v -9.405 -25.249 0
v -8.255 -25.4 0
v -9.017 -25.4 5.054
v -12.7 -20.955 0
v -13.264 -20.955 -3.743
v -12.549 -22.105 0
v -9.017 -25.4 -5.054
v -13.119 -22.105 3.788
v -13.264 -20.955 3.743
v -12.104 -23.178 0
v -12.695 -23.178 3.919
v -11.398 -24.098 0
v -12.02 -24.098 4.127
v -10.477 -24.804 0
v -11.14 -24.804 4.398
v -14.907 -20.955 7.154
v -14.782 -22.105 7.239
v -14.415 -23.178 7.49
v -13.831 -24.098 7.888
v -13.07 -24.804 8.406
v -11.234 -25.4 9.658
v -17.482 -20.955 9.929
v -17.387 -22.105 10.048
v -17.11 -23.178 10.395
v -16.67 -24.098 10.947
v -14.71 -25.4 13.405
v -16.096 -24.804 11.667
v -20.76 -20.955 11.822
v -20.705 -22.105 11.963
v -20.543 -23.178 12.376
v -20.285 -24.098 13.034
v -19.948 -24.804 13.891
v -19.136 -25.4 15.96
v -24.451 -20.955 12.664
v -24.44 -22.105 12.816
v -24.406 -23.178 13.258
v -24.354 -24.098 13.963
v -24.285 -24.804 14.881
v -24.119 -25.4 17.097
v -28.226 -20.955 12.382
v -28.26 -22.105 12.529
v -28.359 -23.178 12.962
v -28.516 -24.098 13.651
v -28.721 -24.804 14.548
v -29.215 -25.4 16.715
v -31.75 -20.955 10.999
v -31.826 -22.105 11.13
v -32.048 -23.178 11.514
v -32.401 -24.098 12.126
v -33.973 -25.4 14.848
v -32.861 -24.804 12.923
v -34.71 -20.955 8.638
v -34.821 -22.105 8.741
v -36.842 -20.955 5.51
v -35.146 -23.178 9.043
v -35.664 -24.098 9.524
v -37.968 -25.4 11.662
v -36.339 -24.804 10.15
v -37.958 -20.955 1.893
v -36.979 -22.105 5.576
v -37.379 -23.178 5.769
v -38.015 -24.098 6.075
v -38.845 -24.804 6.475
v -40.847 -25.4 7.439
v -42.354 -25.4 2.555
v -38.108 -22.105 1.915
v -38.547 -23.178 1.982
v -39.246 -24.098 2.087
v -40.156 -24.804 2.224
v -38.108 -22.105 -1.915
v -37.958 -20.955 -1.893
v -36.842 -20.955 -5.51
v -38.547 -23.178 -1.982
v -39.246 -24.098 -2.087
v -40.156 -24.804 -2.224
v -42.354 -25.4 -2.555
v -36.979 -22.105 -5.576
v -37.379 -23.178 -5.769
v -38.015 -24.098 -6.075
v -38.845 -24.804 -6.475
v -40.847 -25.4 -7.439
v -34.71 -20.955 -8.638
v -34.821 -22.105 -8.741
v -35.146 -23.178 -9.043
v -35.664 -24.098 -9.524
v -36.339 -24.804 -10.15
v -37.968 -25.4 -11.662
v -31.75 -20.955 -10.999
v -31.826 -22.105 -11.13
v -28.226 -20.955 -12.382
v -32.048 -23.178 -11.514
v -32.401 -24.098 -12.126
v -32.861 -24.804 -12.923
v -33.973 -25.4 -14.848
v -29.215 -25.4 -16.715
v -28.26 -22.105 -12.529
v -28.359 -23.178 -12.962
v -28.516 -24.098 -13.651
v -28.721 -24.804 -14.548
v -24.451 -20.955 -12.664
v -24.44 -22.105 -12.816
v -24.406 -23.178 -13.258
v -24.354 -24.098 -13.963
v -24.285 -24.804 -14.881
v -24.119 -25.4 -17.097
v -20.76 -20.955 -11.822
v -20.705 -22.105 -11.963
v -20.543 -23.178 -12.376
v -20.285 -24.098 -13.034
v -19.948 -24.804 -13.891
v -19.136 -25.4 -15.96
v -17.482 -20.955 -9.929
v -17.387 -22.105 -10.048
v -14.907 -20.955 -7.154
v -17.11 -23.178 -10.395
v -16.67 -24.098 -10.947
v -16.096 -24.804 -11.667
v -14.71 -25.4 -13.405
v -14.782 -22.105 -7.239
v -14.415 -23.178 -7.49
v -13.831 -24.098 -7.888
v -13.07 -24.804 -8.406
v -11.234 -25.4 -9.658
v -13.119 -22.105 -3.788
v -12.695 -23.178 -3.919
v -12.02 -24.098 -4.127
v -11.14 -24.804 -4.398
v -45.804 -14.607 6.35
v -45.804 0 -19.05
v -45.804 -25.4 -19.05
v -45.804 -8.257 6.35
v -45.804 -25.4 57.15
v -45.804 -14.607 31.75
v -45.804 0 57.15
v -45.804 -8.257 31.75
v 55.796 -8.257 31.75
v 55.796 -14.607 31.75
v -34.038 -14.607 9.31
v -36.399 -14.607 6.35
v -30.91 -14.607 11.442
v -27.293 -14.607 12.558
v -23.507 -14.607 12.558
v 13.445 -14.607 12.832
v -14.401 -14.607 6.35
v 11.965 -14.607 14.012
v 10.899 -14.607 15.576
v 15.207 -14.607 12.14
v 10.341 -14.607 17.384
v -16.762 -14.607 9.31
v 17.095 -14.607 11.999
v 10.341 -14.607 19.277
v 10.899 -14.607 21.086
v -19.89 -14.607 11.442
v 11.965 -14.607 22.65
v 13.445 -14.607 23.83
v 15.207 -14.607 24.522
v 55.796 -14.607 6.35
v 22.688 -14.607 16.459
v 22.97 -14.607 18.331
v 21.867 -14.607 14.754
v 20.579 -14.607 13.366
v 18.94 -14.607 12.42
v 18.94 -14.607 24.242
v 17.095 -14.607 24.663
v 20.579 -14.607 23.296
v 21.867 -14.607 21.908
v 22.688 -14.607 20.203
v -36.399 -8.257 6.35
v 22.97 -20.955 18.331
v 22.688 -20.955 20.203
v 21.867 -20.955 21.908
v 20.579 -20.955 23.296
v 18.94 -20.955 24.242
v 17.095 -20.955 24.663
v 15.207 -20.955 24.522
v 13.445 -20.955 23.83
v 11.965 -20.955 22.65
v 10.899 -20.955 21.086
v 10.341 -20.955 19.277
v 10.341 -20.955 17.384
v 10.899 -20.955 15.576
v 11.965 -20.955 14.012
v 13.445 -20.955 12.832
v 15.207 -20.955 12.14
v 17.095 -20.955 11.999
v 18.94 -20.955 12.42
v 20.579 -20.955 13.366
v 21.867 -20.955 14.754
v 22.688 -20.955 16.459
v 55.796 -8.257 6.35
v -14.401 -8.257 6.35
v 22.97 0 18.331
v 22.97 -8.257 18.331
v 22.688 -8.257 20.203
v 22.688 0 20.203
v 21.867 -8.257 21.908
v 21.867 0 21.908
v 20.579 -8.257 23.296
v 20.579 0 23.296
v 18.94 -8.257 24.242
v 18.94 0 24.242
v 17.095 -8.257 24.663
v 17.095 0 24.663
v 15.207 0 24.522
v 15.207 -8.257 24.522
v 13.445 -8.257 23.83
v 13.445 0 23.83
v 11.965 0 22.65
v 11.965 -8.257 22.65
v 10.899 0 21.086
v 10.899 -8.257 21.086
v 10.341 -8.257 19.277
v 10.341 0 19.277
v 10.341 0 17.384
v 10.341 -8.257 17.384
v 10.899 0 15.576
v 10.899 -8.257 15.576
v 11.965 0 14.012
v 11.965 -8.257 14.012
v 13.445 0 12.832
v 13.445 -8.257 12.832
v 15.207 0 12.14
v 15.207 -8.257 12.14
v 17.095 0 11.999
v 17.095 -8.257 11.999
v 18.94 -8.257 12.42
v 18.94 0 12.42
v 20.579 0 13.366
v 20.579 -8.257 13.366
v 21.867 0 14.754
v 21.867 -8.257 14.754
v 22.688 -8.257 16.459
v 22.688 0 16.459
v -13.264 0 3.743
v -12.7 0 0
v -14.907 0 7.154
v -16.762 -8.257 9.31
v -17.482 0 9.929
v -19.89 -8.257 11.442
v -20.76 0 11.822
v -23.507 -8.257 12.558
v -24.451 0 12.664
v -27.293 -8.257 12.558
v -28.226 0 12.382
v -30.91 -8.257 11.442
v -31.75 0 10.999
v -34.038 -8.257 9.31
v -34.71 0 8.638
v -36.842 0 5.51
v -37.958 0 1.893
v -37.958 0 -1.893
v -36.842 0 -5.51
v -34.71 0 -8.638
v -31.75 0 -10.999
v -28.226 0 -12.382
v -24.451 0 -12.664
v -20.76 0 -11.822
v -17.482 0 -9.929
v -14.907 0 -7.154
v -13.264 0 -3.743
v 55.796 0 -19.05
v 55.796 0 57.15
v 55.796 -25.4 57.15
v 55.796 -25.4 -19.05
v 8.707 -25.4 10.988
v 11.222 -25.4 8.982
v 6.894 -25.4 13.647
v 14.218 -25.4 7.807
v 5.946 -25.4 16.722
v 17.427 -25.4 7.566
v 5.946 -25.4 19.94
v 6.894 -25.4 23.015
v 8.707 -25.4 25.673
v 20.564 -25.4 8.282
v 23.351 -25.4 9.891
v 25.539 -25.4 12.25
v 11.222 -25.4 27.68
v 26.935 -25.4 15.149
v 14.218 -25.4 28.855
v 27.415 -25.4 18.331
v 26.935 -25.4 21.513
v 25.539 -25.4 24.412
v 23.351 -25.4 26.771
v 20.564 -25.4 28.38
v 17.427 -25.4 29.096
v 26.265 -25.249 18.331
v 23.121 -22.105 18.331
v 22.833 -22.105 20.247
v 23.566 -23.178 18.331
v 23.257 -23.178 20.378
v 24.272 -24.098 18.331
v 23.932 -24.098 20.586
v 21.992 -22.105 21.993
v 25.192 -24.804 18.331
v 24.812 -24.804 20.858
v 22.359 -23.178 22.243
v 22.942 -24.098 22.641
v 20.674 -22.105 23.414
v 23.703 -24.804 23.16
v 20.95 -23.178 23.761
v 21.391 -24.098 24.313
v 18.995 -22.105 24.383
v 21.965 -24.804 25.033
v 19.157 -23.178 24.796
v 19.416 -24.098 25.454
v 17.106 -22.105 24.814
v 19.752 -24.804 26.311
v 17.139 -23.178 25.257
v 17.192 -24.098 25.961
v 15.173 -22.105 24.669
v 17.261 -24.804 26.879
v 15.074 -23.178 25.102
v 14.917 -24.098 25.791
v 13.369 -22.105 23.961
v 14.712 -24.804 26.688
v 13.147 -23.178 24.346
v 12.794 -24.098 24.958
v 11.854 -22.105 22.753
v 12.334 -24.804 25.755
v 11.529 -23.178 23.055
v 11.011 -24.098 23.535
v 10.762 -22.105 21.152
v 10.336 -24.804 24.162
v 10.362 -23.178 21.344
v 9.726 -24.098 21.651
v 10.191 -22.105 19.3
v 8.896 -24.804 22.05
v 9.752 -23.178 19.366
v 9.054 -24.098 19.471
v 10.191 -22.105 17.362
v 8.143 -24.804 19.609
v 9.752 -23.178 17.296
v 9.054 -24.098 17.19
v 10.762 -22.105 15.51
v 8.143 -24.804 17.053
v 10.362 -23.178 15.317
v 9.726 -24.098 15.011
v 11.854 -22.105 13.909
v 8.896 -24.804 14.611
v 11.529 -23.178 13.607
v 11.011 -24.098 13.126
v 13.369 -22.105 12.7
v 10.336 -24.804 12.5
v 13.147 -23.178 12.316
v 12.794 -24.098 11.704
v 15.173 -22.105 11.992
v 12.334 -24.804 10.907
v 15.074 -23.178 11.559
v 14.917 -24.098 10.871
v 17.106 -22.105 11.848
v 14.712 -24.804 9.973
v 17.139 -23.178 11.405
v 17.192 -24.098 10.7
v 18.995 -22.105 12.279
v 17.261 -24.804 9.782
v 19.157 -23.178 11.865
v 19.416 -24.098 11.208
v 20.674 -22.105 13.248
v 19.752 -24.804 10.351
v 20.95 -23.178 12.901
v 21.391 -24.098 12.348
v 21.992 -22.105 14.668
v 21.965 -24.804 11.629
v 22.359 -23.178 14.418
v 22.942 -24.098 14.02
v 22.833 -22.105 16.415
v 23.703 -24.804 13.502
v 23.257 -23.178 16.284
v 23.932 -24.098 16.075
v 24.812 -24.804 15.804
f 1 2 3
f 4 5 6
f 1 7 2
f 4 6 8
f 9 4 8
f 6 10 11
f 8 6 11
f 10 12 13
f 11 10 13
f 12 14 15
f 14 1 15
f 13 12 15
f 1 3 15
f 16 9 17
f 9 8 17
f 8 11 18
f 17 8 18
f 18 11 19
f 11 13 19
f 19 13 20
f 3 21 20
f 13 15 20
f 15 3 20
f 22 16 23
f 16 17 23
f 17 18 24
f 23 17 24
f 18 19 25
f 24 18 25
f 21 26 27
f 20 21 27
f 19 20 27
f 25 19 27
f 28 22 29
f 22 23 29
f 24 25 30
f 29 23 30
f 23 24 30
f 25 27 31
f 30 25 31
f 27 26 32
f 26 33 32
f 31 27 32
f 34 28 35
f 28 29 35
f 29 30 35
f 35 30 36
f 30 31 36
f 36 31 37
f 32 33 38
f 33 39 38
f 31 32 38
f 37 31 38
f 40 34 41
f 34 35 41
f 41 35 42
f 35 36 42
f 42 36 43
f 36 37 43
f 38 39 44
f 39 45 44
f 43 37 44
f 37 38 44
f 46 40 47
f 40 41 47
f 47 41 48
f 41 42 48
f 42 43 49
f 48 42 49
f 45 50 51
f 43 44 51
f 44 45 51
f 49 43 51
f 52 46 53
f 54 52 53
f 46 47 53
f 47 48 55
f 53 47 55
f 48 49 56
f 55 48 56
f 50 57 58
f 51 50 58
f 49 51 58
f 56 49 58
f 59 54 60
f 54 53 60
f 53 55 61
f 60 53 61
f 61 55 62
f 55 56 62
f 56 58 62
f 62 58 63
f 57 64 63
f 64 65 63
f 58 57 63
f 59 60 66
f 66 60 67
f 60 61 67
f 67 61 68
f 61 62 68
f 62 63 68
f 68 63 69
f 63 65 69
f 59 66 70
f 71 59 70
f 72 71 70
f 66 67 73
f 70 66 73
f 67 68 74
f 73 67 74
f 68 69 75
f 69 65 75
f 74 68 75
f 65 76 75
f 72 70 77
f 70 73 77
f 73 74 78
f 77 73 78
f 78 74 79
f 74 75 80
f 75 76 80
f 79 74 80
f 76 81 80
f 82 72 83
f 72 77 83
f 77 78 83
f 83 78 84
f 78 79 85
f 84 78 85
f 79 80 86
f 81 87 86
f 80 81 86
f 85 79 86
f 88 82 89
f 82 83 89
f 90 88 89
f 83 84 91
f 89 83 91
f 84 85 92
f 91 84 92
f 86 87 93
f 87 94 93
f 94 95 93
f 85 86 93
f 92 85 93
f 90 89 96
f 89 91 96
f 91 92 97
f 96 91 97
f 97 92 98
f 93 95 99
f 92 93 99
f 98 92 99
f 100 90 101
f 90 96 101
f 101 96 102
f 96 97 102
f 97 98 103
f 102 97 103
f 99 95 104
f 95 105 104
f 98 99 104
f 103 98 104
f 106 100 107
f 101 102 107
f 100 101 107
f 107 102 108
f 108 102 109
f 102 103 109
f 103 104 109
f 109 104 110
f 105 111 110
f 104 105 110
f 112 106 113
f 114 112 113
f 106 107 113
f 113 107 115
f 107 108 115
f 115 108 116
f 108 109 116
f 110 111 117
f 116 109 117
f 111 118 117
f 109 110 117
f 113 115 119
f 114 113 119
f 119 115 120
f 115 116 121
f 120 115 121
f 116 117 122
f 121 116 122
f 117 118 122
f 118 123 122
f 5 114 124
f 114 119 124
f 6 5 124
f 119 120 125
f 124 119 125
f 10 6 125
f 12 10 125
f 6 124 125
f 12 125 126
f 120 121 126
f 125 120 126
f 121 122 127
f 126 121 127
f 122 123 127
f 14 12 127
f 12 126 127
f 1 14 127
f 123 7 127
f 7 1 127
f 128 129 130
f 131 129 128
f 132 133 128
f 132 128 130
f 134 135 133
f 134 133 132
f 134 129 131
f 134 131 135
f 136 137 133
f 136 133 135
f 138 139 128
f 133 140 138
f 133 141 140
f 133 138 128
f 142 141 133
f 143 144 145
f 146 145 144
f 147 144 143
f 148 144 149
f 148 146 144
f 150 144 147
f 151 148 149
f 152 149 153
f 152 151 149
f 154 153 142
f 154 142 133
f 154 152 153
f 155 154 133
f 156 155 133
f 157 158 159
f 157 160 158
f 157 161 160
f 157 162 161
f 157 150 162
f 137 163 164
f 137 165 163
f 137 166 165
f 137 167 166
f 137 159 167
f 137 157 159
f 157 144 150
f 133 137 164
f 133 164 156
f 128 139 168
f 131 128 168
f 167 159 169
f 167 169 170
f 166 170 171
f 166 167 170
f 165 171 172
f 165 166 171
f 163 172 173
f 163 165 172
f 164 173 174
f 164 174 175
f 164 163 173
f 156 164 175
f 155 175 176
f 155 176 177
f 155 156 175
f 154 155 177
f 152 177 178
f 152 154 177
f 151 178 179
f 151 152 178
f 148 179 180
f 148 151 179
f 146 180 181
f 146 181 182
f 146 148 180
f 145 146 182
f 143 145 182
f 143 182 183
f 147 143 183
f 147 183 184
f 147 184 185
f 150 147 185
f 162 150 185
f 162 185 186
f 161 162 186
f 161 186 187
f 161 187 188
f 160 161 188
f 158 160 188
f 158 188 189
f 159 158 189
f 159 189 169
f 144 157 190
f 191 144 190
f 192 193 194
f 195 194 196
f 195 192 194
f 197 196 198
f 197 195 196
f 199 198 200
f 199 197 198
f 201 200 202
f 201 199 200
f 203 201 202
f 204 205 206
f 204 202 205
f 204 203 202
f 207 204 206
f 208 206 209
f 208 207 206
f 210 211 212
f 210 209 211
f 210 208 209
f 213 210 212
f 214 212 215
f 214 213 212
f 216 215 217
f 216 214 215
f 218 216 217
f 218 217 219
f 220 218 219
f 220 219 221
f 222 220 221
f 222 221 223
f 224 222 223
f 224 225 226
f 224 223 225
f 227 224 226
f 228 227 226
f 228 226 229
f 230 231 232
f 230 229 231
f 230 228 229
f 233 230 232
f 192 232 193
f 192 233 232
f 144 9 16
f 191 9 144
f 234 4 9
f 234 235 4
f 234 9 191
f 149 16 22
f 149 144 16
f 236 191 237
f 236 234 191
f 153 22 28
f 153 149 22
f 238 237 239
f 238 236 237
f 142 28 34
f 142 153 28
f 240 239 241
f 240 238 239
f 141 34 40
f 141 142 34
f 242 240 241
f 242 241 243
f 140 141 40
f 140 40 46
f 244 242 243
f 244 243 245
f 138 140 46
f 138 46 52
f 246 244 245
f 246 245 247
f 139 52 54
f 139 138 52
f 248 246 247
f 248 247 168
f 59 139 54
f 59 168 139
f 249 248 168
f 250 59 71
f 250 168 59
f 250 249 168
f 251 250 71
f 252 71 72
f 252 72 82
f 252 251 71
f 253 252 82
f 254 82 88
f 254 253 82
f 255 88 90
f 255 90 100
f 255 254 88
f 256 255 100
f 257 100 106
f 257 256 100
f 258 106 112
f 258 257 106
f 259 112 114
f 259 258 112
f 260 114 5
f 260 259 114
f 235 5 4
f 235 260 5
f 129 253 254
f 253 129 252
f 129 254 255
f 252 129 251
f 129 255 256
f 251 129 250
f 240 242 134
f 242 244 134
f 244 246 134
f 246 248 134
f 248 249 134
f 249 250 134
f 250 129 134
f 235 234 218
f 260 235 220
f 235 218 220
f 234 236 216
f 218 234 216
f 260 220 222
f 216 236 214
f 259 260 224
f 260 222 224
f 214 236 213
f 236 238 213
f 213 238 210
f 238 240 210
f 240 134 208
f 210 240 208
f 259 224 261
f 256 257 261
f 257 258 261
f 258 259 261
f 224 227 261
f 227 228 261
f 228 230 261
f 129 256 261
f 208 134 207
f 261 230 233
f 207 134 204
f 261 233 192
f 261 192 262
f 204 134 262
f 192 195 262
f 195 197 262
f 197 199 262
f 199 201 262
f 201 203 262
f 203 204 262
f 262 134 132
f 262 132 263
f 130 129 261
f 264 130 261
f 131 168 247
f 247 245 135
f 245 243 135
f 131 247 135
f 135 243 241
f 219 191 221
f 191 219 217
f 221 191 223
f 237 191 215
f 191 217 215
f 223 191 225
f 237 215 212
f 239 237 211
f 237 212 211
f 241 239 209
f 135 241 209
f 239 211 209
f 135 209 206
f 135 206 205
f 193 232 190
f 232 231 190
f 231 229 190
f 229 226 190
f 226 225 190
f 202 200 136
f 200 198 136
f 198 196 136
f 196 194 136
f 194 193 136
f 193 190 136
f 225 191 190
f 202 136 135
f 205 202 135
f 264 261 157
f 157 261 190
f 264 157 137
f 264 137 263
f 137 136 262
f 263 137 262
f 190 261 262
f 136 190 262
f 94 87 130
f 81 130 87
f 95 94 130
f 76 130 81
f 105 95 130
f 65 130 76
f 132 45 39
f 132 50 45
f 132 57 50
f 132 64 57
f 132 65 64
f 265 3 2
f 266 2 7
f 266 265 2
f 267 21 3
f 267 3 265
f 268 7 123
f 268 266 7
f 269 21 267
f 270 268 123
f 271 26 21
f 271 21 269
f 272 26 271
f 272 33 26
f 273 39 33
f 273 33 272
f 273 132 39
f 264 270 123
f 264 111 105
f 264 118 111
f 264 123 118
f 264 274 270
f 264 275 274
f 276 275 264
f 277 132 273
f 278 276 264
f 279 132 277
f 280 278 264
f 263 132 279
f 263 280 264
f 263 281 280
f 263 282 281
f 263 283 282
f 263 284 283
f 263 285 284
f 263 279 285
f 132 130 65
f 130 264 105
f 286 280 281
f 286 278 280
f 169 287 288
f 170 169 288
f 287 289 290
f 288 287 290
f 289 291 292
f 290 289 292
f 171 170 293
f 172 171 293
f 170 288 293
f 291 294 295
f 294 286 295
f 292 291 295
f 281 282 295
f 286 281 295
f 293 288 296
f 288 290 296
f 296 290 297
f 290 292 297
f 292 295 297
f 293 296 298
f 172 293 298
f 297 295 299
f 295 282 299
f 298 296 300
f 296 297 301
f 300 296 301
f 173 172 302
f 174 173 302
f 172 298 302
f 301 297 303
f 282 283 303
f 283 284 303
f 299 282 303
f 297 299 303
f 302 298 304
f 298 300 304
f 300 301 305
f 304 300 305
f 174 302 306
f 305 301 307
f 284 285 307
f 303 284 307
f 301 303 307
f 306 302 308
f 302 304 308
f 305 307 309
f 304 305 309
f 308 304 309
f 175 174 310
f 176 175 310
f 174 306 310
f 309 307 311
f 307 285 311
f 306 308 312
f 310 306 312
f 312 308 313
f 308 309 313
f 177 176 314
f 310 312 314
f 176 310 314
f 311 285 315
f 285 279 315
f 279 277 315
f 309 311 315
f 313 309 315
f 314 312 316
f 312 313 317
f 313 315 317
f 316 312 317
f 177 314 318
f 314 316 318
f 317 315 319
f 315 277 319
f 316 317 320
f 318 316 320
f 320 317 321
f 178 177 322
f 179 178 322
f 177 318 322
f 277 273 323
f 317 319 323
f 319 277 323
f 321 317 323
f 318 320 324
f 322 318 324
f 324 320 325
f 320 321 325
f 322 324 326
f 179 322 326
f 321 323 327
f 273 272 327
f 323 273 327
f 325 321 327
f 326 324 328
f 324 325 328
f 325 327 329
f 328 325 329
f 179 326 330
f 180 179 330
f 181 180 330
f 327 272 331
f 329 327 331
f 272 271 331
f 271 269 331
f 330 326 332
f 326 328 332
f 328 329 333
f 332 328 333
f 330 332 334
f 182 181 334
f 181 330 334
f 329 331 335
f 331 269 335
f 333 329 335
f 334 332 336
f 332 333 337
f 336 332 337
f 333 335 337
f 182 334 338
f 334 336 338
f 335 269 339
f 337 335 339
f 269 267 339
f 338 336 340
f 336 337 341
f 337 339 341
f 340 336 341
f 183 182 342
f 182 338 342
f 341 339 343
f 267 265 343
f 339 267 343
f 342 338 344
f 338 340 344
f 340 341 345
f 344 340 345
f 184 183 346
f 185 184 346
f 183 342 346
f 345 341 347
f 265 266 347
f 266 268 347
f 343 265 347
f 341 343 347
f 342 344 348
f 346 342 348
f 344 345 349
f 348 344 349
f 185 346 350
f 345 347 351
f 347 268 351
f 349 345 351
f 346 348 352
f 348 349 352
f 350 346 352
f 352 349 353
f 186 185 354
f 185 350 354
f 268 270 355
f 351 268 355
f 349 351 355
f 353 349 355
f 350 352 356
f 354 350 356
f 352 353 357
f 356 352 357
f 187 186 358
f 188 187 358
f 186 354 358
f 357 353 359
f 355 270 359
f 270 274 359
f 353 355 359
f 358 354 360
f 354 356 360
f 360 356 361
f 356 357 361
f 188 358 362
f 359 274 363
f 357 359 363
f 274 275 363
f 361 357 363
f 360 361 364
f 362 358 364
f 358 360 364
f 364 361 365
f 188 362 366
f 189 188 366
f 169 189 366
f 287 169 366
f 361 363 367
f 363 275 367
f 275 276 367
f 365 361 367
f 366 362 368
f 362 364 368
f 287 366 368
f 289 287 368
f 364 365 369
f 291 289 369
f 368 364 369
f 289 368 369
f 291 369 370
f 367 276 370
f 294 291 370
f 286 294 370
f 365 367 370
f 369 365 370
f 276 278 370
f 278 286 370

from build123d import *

# Parameters (mm, degrees)
F0_W     = 101.6
F0_H     = 76.2
F0_R     = 12.7
F0_R_2   = 6.35
F1_DEPTH = 25.4
F2_R     = 4.445
F3_W     = 6.35
F3_H     = 25.4
F4_DEPTH = 101.601


with BuildPart() as f1:
    # F0 (on Front) → F1 (new body)
    with BuildSketch(Plane.XZ):
        with Locations((4.996498, 19.05)):
            Rectangle(F0_W, F0_H)
        with Locations((-25.4, 0)):
            Circle(F0_R, mode=Mode.SUBTRACT)
        with Locations((16.619995, 18.330872)):
            Circle(F0_R_2, mode=Mode.SUBTRACT)
    extrude(amount=F1_DEPTH)

    # F2
    f2_edges = [f1.edges().sort_by_distance(p)[0] for p in [
        (-38.1, -25.4, 0),
        (10.269995, -25.4, 18.330872),
    ]]
    fillet(f2_edges, radius=F2_R)

    # F3 (on face) → F4 (cut, through all)
    with BuildSketch(Plane.YZ.offset(55.796498)):
        with Locations((-11.432072, 19.05)):
            Rectangle(F3_W, F3_H)
    extrude(amount=-F4_DEPTH, mode=Mode.SUBTRACT)


solid = f1.part
